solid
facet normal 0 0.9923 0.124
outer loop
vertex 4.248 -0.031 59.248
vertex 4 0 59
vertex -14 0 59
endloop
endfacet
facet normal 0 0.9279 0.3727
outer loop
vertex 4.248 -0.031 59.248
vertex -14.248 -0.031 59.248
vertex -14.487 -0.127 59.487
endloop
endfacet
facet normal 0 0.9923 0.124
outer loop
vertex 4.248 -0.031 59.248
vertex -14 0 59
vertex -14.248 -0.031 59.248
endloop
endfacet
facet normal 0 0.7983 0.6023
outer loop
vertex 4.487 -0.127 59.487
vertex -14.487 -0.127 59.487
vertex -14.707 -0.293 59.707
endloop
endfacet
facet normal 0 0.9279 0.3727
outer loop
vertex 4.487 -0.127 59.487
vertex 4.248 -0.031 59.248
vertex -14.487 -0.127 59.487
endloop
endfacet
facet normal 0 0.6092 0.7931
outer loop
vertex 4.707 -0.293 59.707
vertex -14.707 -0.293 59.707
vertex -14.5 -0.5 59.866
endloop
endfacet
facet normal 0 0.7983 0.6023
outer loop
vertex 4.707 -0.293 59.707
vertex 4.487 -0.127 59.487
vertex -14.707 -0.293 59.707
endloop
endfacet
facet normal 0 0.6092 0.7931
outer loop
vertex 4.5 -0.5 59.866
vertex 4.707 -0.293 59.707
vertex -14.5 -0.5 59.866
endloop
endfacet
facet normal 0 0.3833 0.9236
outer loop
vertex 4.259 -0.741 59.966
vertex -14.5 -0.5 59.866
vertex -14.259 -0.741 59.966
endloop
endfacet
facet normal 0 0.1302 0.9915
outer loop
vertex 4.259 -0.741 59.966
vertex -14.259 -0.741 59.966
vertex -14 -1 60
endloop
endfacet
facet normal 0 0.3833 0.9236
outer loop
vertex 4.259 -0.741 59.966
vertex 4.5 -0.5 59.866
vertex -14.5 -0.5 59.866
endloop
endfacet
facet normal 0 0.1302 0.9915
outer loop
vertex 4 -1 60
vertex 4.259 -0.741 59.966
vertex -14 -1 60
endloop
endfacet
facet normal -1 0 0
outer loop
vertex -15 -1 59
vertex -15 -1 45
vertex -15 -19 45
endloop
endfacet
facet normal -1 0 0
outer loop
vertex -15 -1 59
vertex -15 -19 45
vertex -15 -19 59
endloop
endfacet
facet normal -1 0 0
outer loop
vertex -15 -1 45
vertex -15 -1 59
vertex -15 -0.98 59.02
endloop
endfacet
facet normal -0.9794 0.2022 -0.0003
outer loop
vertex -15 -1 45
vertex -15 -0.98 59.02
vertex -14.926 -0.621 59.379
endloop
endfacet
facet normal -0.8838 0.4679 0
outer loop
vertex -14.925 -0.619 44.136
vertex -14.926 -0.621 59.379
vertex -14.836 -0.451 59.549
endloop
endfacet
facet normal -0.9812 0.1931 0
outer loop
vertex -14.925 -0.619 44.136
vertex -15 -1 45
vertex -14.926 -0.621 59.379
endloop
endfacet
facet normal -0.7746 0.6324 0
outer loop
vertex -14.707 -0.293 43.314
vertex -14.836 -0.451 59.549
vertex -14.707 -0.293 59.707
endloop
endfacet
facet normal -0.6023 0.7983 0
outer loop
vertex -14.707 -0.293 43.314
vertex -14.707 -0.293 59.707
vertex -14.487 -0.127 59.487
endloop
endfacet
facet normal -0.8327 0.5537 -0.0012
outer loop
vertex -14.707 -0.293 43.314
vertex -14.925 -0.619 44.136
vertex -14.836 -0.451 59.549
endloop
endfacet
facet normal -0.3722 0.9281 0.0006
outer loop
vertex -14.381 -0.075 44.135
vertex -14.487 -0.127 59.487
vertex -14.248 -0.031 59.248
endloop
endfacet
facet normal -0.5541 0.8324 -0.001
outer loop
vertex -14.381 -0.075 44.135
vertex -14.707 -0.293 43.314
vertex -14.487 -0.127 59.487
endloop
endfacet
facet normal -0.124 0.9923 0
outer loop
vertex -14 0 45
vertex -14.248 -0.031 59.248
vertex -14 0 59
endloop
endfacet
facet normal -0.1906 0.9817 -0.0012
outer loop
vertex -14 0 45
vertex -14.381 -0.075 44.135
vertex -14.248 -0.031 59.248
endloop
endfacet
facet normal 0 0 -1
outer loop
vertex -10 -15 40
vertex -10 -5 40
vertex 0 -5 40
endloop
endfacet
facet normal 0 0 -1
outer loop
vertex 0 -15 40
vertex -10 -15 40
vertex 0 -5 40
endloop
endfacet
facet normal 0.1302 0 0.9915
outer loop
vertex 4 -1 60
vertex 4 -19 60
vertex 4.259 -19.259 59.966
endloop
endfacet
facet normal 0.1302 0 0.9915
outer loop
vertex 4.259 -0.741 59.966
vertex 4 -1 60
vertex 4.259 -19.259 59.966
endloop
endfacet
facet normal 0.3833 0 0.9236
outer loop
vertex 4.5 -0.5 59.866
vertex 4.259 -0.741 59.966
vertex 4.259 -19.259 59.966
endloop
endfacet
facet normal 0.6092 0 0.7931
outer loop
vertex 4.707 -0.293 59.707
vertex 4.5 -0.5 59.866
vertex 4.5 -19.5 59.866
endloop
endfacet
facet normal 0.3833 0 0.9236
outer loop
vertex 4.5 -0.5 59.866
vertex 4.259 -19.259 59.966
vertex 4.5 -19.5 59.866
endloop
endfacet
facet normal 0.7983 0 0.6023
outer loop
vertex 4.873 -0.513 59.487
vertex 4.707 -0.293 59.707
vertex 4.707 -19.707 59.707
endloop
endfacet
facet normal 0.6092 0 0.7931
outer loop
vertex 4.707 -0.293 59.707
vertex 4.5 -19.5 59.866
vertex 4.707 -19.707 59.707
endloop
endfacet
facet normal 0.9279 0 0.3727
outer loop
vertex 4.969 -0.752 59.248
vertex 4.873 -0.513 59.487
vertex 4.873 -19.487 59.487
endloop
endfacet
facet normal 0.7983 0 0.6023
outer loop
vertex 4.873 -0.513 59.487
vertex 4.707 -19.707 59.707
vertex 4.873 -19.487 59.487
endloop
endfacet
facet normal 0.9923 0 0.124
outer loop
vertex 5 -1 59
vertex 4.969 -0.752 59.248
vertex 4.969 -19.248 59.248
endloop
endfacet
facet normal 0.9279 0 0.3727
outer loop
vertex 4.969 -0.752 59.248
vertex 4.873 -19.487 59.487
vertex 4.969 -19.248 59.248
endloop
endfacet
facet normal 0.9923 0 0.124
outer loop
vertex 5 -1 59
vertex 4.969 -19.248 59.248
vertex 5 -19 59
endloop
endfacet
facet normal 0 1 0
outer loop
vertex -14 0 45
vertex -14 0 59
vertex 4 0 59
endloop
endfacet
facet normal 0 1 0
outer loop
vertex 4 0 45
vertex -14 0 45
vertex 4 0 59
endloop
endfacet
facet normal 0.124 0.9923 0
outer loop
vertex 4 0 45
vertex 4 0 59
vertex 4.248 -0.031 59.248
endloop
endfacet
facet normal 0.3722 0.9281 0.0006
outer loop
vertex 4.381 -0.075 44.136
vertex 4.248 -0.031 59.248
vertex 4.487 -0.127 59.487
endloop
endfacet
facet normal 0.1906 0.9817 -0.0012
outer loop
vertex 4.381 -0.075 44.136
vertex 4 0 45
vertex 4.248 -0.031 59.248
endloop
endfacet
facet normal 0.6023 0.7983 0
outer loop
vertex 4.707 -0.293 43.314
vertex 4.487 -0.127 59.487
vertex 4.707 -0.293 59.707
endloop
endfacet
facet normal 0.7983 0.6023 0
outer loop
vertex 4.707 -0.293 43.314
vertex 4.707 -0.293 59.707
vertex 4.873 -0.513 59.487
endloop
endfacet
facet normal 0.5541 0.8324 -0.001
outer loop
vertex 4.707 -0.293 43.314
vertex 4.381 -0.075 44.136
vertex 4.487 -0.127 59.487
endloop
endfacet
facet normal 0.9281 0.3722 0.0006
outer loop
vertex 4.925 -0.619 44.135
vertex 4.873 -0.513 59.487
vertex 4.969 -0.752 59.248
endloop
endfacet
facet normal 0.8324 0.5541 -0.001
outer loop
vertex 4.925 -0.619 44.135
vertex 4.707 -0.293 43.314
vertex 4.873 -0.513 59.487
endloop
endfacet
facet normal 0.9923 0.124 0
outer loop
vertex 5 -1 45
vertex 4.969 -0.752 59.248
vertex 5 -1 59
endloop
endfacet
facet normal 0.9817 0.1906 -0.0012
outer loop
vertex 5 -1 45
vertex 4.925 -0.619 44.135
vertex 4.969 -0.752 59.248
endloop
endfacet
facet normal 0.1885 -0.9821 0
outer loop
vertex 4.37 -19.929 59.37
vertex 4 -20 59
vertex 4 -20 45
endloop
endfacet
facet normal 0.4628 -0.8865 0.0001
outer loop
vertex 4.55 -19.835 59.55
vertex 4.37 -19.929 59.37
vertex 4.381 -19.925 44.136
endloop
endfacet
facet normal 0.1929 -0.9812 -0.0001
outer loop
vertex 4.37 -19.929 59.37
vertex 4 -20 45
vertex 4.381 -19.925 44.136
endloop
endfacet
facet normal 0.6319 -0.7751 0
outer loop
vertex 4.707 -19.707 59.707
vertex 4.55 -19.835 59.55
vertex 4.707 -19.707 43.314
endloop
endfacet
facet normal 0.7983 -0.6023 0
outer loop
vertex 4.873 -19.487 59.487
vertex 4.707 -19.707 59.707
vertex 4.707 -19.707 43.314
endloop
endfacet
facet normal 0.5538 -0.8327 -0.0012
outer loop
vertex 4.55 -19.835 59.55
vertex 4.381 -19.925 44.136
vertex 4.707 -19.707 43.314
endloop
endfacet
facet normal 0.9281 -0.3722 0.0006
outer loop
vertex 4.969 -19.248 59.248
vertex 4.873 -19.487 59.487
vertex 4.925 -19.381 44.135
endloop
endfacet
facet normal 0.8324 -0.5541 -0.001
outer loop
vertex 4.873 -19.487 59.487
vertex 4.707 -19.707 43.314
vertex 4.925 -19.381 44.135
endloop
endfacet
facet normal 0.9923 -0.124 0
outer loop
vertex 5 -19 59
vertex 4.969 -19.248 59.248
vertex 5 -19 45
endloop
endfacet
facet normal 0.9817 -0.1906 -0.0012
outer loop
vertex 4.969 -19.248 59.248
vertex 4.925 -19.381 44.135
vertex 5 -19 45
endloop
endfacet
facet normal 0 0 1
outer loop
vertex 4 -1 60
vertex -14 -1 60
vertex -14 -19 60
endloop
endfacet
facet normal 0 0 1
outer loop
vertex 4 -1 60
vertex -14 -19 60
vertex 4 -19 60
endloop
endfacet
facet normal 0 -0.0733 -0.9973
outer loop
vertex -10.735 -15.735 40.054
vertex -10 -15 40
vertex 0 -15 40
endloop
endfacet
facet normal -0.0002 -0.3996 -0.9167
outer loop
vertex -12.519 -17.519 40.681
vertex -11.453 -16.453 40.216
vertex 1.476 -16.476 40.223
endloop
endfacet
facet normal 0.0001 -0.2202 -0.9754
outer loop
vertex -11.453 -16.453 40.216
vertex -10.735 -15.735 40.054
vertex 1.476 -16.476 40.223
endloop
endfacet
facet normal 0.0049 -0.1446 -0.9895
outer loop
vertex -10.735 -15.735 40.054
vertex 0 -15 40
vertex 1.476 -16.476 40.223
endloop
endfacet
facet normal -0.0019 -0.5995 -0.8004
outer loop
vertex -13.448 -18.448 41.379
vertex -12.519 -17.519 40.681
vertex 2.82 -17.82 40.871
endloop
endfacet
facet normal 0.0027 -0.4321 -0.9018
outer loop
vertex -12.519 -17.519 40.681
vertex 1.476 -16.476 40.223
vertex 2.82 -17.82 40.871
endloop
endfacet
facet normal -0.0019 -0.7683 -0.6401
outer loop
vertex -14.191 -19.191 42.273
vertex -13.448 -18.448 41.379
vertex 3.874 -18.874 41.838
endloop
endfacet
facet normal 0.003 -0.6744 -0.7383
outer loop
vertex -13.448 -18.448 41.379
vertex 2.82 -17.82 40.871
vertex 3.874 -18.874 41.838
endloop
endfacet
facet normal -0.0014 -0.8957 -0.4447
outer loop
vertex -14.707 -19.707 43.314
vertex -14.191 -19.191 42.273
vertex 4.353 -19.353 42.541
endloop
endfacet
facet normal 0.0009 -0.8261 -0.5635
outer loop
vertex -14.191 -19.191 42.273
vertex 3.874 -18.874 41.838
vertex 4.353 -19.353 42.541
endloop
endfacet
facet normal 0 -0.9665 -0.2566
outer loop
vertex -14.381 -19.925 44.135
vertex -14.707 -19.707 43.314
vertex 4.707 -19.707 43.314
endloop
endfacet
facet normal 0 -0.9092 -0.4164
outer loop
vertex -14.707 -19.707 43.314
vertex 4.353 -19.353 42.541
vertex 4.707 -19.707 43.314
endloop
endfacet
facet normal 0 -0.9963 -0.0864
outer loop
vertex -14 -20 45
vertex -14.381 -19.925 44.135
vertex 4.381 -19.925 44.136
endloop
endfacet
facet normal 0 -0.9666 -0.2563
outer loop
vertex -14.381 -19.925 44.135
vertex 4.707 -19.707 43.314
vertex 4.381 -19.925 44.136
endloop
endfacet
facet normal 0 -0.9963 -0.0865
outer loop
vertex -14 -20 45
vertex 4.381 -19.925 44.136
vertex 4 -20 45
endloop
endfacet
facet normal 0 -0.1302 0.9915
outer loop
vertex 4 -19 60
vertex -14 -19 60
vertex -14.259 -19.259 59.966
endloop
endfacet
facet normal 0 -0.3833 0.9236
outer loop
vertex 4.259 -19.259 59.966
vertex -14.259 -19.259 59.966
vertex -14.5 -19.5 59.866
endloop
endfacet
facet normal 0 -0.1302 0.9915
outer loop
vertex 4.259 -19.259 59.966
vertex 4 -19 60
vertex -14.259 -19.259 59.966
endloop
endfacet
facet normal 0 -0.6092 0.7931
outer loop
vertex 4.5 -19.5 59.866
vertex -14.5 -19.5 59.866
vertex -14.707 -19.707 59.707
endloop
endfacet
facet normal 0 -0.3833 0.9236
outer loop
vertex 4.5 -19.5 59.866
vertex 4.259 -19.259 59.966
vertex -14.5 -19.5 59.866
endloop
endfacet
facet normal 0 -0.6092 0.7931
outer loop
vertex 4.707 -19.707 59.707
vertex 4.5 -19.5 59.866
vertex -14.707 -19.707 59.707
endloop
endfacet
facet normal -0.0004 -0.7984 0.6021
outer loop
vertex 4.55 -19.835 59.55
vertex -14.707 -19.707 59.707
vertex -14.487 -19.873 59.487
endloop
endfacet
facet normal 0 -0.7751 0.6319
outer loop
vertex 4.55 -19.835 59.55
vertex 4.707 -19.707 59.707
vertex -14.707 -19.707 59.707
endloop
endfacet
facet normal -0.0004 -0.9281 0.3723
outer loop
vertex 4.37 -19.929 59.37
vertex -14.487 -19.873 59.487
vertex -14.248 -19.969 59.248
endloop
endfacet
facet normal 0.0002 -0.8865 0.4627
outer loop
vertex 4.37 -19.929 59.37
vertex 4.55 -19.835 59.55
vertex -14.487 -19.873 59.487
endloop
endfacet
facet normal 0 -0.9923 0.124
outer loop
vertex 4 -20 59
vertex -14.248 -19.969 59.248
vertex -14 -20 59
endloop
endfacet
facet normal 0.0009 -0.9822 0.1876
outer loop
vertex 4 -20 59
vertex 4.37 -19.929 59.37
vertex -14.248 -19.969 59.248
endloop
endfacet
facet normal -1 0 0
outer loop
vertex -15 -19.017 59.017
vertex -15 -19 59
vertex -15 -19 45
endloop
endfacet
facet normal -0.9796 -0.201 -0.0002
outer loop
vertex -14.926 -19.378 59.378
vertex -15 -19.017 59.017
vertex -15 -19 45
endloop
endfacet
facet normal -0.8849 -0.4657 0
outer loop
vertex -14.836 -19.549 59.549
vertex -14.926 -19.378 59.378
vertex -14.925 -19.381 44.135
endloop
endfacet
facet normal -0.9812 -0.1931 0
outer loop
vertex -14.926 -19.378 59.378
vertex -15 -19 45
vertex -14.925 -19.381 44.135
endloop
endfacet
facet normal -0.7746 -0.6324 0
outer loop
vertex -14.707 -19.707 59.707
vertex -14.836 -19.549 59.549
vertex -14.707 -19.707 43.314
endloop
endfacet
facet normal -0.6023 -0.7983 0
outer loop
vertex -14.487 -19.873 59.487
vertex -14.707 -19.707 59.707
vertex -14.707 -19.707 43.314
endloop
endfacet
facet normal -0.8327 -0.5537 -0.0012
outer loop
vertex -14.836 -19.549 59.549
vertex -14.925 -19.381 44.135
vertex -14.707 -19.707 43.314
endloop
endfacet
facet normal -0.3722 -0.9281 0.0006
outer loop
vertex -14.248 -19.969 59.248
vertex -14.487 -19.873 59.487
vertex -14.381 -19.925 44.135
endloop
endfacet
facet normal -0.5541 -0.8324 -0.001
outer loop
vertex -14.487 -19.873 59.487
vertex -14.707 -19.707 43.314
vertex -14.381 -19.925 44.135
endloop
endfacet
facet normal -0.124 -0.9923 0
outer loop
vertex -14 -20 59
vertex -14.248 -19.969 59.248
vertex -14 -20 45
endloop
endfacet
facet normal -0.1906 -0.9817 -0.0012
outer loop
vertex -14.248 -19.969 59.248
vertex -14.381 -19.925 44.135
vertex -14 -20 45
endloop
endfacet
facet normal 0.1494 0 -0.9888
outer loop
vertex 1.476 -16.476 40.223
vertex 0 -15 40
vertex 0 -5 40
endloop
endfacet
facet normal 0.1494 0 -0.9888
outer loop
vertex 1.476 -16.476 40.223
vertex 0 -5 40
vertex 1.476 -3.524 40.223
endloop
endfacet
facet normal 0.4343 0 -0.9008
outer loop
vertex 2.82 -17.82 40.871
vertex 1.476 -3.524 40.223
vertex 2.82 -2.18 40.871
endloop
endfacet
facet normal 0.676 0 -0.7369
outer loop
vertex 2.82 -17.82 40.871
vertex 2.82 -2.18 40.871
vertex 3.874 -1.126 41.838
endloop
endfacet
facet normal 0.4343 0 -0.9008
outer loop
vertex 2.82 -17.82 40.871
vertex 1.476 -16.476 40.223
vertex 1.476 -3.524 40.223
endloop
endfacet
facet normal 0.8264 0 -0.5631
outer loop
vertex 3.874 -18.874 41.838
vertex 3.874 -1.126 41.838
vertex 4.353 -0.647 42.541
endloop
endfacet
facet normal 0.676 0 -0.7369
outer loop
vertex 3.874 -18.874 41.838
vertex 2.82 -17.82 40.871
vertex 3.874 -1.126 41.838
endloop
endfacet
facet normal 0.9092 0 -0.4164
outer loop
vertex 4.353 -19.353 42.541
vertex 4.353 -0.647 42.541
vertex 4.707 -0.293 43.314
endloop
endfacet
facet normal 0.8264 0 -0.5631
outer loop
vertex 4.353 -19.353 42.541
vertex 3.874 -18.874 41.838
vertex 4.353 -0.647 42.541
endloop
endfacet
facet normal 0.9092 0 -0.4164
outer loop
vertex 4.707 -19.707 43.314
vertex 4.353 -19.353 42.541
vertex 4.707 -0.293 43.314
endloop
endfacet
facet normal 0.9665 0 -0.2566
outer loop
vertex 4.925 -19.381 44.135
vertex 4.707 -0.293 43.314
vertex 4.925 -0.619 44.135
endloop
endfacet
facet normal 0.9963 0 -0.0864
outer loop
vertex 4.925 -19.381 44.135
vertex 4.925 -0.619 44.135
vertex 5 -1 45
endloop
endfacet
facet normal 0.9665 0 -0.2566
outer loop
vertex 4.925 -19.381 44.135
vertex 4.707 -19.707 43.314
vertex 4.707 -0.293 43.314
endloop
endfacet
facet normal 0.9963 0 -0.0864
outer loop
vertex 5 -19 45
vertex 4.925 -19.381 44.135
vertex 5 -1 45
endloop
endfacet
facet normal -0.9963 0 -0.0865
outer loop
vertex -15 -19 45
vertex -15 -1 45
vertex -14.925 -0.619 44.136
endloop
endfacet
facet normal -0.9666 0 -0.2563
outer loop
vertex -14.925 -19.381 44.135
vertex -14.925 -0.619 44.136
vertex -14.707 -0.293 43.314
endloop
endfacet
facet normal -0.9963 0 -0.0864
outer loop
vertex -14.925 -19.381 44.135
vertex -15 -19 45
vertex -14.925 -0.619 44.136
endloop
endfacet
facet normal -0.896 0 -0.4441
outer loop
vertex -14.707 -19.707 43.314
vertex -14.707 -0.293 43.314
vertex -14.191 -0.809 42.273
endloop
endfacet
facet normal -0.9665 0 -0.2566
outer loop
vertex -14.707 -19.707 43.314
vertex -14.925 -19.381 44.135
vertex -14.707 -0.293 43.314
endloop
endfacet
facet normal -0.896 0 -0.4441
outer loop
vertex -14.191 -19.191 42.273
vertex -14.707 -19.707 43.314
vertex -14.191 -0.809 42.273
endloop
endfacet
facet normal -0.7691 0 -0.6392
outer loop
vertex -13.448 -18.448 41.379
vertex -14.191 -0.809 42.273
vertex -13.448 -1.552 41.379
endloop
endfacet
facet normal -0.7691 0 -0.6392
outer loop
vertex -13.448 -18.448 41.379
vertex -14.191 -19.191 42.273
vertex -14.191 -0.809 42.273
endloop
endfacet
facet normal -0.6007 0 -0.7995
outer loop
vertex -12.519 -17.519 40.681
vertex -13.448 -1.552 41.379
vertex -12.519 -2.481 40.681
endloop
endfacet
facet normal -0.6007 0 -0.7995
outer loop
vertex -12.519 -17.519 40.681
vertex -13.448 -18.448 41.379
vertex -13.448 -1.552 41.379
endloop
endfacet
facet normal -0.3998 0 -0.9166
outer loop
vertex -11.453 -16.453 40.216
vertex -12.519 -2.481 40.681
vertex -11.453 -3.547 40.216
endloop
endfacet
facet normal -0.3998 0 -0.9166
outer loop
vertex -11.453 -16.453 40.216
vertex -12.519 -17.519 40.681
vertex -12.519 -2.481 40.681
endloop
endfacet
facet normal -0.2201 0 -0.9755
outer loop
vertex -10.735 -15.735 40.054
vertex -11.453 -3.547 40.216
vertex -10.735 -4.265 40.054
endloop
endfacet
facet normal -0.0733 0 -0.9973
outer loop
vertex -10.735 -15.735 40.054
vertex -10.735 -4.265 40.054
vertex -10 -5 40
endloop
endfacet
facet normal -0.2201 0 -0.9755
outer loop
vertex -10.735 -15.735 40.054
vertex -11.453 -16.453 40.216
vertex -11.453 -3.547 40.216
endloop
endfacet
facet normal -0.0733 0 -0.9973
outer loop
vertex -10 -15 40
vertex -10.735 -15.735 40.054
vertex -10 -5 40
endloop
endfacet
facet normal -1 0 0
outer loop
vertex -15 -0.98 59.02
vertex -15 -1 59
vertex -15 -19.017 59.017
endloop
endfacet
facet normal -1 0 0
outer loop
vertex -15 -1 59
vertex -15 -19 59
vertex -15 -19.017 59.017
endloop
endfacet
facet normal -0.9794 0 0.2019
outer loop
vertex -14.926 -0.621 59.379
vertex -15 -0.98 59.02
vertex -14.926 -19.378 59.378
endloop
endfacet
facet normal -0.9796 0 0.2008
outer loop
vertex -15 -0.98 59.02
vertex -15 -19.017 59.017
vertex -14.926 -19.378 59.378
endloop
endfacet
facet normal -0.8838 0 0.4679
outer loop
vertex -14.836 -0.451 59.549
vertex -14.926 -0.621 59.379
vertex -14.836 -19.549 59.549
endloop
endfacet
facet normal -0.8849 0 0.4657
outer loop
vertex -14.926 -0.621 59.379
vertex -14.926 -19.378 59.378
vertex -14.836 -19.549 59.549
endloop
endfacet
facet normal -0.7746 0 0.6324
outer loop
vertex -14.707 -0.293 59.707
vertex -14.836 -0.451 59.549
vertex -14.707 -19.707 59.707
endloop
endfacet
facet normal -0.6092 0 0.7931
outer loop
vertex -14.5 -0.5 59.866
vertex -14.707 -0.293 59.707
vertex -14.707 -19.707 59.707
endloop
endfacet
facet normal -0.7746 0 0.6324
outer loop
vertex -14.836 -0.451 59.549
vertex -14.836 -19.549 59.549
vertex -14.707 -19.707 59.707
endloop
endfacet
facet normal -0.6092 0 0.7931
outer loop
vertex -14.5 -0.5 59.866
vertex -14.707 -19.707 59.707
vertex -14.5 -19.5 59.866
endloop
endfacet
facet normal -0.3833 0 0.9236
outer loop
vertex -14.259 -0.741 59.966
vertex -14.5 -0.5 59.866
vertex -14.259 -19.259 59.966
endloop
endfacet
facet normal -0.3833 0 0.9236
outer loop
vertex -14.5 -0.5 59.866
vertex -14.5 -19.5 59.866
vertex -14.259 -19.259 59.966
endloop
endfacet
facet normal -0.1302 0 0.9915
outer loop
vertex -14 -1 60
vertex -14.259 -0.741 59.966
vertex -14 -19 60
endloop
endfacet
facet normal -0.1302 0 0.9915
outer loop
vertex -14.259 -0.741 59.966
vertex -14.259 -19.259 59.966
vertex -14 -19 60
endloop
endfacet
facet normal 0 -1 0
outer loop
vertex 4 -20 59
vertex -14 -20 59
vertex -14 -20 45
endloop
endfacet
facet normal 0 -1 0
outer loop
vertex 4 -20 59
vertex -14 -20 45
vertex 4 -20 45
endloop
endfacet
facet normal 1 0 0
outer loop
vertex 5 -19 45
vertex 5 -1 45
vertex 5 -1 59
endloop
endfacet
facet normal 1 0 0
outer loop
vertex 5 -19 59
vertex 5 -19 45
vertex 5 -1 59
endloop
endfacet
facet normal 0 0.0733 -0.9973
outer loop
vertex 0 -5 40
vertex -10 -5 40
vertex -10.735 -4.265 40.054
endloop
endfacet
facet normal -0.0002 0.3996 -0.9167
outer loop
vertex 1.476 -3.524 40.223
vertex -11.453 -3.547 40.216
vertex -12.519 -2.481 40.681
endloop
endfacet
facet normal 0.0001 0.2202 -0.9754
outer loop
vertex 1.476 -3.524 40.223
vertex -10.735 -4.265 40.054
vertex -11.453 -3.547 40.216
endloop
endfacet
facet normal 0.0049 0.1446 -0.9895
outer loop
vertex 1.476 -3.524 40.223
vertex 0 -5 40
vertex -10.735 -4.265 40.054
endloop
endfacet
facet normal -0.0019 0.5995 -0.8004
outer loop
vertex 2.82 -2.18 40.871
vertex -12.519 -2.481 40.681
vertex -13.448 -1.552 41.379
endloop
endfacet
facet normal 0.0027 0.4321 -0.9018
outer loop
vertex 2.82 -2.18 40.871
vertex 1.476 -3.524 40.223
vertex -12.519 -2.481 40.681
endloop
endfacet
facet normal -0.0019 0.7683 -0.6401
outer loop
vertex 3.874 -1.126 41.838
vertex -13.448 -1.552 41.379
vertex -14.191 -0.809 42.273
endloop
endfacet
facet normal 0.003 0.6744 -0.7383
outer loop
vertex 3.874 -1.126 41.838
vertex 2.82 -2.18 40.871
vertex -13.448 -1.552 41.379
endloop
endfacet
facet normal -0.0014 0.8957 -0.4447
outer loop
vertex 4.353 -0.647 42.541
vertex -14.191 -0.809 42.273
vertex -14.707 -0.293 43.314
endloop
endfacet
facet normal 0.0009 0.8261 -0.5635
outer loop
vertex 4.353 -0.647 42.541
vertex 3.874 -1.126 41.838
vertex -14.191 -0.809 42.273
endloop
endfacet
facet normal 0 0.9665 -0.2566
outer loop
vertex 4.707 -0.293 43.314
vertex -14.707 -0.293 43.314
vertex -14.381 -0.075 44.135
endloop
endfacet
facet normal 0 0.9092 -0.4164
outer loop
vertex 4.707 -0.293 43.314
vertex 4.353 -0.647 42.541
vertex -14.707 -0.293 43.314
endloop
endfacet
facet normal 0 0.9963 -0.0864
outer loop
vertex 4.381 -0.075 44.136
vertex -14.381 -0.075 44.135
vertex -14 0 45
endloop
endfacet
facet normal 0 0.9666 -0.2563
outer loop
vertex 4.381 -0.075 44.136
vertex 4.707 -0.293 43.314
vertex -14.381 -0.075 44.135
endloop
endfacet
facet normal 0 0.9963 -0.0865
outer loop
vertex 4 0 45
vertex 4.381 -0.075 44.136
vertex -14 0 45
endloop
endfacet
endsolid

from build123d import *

# Parameters (mm, degrees)
F0_W        = 20
F0_H        = 20
F1_DEPTH    = 20
F2_R        = 5
F3_R        = 1
F4_T1_DEPTH = 20.75
F5_T1_DEPTH = 20.75


# Not quite as in the source:
# - a fillet or chamfer that OpenCascade refuses, or shapes differently, is made with other operations: its cross-section is extruded or revolved along the edge and cut away or added


with BuildPart() as f1:
    # F0 (on Front) → F1 (new body)
    with BuildSketch(Plane.XZ):
        with Locations((-5, 50)):
            Rectangle(F0_W, F0_H)
    extrude(amount=F1_DEPTH)

    # F2
    f2_edges = [f1.edges().sort_by_distance(p)[0] for p in [
        (-15, -10, 40),
        (5, -10, 40),
        (-5, 0, 40),
        (-5, -20, 40),
    ]]
    fillet(f2_edges, radius=F2_R)

    # F3
    f3_edges = [f1.edges().sort_by_distance(p)[0] for p in [
        (5, -10, 60),
        (-15, -10, 60),
        (-5, 0, 60),
        (-5, -20, 60),
    ]]
    fillet(f3_edges, radius=F3_R)

    # F4: fillet of radius 1 on 4 edges, made by hand

    # F4_s2 → F4_t1 (cut)
    with BuildSketch(Plane.XY.offset(40.75)):
        with BuildLine():
            ThreePointArc((4, 0), (4.7071067812, -0.2928932188), (5, -1))
            Line((5, -1), (5, 0))
            Line((5, 0), (4, 0))
        make_face()
        with BuildLine():
            ThreePointArc((4, -20), (4.7071067812, -19.7071067812), (5, -19))
            Line((5, -19), (5, -20))
            Line((5, -20), (4, -20))
        make_face()
    extrude(amount=F4_T1_DEPTH, mode=Mode.SUBTRACT)

    # F5: fillet of radius 1 on 4 edges, made by hand

    # F5_s2 → F5_t1 (cut)
    with BuildSketch(Plane.XY.offset(40.75)):
        with BuildLine():
            ThreePointArc((-15, -1), (-14.7071067812, -0.2928932188), (-14, 0))
            Line((-14, 0), (-15, 0))
            Line((-15, 0), (-15, -1))
        make_face()
        with BuildLine():
            ThreePointArc((-15, -19), (-14.7071067812, -19.7071067812), (-14, -20))
            Line((-14, -20), (-15, -20))
            Line((-15, -20), (-15, -19))
        make_face()
    extrude(amount=F5_T1_DEPTH, mode=Mode.SUBTRACT)


solid = f1.part
